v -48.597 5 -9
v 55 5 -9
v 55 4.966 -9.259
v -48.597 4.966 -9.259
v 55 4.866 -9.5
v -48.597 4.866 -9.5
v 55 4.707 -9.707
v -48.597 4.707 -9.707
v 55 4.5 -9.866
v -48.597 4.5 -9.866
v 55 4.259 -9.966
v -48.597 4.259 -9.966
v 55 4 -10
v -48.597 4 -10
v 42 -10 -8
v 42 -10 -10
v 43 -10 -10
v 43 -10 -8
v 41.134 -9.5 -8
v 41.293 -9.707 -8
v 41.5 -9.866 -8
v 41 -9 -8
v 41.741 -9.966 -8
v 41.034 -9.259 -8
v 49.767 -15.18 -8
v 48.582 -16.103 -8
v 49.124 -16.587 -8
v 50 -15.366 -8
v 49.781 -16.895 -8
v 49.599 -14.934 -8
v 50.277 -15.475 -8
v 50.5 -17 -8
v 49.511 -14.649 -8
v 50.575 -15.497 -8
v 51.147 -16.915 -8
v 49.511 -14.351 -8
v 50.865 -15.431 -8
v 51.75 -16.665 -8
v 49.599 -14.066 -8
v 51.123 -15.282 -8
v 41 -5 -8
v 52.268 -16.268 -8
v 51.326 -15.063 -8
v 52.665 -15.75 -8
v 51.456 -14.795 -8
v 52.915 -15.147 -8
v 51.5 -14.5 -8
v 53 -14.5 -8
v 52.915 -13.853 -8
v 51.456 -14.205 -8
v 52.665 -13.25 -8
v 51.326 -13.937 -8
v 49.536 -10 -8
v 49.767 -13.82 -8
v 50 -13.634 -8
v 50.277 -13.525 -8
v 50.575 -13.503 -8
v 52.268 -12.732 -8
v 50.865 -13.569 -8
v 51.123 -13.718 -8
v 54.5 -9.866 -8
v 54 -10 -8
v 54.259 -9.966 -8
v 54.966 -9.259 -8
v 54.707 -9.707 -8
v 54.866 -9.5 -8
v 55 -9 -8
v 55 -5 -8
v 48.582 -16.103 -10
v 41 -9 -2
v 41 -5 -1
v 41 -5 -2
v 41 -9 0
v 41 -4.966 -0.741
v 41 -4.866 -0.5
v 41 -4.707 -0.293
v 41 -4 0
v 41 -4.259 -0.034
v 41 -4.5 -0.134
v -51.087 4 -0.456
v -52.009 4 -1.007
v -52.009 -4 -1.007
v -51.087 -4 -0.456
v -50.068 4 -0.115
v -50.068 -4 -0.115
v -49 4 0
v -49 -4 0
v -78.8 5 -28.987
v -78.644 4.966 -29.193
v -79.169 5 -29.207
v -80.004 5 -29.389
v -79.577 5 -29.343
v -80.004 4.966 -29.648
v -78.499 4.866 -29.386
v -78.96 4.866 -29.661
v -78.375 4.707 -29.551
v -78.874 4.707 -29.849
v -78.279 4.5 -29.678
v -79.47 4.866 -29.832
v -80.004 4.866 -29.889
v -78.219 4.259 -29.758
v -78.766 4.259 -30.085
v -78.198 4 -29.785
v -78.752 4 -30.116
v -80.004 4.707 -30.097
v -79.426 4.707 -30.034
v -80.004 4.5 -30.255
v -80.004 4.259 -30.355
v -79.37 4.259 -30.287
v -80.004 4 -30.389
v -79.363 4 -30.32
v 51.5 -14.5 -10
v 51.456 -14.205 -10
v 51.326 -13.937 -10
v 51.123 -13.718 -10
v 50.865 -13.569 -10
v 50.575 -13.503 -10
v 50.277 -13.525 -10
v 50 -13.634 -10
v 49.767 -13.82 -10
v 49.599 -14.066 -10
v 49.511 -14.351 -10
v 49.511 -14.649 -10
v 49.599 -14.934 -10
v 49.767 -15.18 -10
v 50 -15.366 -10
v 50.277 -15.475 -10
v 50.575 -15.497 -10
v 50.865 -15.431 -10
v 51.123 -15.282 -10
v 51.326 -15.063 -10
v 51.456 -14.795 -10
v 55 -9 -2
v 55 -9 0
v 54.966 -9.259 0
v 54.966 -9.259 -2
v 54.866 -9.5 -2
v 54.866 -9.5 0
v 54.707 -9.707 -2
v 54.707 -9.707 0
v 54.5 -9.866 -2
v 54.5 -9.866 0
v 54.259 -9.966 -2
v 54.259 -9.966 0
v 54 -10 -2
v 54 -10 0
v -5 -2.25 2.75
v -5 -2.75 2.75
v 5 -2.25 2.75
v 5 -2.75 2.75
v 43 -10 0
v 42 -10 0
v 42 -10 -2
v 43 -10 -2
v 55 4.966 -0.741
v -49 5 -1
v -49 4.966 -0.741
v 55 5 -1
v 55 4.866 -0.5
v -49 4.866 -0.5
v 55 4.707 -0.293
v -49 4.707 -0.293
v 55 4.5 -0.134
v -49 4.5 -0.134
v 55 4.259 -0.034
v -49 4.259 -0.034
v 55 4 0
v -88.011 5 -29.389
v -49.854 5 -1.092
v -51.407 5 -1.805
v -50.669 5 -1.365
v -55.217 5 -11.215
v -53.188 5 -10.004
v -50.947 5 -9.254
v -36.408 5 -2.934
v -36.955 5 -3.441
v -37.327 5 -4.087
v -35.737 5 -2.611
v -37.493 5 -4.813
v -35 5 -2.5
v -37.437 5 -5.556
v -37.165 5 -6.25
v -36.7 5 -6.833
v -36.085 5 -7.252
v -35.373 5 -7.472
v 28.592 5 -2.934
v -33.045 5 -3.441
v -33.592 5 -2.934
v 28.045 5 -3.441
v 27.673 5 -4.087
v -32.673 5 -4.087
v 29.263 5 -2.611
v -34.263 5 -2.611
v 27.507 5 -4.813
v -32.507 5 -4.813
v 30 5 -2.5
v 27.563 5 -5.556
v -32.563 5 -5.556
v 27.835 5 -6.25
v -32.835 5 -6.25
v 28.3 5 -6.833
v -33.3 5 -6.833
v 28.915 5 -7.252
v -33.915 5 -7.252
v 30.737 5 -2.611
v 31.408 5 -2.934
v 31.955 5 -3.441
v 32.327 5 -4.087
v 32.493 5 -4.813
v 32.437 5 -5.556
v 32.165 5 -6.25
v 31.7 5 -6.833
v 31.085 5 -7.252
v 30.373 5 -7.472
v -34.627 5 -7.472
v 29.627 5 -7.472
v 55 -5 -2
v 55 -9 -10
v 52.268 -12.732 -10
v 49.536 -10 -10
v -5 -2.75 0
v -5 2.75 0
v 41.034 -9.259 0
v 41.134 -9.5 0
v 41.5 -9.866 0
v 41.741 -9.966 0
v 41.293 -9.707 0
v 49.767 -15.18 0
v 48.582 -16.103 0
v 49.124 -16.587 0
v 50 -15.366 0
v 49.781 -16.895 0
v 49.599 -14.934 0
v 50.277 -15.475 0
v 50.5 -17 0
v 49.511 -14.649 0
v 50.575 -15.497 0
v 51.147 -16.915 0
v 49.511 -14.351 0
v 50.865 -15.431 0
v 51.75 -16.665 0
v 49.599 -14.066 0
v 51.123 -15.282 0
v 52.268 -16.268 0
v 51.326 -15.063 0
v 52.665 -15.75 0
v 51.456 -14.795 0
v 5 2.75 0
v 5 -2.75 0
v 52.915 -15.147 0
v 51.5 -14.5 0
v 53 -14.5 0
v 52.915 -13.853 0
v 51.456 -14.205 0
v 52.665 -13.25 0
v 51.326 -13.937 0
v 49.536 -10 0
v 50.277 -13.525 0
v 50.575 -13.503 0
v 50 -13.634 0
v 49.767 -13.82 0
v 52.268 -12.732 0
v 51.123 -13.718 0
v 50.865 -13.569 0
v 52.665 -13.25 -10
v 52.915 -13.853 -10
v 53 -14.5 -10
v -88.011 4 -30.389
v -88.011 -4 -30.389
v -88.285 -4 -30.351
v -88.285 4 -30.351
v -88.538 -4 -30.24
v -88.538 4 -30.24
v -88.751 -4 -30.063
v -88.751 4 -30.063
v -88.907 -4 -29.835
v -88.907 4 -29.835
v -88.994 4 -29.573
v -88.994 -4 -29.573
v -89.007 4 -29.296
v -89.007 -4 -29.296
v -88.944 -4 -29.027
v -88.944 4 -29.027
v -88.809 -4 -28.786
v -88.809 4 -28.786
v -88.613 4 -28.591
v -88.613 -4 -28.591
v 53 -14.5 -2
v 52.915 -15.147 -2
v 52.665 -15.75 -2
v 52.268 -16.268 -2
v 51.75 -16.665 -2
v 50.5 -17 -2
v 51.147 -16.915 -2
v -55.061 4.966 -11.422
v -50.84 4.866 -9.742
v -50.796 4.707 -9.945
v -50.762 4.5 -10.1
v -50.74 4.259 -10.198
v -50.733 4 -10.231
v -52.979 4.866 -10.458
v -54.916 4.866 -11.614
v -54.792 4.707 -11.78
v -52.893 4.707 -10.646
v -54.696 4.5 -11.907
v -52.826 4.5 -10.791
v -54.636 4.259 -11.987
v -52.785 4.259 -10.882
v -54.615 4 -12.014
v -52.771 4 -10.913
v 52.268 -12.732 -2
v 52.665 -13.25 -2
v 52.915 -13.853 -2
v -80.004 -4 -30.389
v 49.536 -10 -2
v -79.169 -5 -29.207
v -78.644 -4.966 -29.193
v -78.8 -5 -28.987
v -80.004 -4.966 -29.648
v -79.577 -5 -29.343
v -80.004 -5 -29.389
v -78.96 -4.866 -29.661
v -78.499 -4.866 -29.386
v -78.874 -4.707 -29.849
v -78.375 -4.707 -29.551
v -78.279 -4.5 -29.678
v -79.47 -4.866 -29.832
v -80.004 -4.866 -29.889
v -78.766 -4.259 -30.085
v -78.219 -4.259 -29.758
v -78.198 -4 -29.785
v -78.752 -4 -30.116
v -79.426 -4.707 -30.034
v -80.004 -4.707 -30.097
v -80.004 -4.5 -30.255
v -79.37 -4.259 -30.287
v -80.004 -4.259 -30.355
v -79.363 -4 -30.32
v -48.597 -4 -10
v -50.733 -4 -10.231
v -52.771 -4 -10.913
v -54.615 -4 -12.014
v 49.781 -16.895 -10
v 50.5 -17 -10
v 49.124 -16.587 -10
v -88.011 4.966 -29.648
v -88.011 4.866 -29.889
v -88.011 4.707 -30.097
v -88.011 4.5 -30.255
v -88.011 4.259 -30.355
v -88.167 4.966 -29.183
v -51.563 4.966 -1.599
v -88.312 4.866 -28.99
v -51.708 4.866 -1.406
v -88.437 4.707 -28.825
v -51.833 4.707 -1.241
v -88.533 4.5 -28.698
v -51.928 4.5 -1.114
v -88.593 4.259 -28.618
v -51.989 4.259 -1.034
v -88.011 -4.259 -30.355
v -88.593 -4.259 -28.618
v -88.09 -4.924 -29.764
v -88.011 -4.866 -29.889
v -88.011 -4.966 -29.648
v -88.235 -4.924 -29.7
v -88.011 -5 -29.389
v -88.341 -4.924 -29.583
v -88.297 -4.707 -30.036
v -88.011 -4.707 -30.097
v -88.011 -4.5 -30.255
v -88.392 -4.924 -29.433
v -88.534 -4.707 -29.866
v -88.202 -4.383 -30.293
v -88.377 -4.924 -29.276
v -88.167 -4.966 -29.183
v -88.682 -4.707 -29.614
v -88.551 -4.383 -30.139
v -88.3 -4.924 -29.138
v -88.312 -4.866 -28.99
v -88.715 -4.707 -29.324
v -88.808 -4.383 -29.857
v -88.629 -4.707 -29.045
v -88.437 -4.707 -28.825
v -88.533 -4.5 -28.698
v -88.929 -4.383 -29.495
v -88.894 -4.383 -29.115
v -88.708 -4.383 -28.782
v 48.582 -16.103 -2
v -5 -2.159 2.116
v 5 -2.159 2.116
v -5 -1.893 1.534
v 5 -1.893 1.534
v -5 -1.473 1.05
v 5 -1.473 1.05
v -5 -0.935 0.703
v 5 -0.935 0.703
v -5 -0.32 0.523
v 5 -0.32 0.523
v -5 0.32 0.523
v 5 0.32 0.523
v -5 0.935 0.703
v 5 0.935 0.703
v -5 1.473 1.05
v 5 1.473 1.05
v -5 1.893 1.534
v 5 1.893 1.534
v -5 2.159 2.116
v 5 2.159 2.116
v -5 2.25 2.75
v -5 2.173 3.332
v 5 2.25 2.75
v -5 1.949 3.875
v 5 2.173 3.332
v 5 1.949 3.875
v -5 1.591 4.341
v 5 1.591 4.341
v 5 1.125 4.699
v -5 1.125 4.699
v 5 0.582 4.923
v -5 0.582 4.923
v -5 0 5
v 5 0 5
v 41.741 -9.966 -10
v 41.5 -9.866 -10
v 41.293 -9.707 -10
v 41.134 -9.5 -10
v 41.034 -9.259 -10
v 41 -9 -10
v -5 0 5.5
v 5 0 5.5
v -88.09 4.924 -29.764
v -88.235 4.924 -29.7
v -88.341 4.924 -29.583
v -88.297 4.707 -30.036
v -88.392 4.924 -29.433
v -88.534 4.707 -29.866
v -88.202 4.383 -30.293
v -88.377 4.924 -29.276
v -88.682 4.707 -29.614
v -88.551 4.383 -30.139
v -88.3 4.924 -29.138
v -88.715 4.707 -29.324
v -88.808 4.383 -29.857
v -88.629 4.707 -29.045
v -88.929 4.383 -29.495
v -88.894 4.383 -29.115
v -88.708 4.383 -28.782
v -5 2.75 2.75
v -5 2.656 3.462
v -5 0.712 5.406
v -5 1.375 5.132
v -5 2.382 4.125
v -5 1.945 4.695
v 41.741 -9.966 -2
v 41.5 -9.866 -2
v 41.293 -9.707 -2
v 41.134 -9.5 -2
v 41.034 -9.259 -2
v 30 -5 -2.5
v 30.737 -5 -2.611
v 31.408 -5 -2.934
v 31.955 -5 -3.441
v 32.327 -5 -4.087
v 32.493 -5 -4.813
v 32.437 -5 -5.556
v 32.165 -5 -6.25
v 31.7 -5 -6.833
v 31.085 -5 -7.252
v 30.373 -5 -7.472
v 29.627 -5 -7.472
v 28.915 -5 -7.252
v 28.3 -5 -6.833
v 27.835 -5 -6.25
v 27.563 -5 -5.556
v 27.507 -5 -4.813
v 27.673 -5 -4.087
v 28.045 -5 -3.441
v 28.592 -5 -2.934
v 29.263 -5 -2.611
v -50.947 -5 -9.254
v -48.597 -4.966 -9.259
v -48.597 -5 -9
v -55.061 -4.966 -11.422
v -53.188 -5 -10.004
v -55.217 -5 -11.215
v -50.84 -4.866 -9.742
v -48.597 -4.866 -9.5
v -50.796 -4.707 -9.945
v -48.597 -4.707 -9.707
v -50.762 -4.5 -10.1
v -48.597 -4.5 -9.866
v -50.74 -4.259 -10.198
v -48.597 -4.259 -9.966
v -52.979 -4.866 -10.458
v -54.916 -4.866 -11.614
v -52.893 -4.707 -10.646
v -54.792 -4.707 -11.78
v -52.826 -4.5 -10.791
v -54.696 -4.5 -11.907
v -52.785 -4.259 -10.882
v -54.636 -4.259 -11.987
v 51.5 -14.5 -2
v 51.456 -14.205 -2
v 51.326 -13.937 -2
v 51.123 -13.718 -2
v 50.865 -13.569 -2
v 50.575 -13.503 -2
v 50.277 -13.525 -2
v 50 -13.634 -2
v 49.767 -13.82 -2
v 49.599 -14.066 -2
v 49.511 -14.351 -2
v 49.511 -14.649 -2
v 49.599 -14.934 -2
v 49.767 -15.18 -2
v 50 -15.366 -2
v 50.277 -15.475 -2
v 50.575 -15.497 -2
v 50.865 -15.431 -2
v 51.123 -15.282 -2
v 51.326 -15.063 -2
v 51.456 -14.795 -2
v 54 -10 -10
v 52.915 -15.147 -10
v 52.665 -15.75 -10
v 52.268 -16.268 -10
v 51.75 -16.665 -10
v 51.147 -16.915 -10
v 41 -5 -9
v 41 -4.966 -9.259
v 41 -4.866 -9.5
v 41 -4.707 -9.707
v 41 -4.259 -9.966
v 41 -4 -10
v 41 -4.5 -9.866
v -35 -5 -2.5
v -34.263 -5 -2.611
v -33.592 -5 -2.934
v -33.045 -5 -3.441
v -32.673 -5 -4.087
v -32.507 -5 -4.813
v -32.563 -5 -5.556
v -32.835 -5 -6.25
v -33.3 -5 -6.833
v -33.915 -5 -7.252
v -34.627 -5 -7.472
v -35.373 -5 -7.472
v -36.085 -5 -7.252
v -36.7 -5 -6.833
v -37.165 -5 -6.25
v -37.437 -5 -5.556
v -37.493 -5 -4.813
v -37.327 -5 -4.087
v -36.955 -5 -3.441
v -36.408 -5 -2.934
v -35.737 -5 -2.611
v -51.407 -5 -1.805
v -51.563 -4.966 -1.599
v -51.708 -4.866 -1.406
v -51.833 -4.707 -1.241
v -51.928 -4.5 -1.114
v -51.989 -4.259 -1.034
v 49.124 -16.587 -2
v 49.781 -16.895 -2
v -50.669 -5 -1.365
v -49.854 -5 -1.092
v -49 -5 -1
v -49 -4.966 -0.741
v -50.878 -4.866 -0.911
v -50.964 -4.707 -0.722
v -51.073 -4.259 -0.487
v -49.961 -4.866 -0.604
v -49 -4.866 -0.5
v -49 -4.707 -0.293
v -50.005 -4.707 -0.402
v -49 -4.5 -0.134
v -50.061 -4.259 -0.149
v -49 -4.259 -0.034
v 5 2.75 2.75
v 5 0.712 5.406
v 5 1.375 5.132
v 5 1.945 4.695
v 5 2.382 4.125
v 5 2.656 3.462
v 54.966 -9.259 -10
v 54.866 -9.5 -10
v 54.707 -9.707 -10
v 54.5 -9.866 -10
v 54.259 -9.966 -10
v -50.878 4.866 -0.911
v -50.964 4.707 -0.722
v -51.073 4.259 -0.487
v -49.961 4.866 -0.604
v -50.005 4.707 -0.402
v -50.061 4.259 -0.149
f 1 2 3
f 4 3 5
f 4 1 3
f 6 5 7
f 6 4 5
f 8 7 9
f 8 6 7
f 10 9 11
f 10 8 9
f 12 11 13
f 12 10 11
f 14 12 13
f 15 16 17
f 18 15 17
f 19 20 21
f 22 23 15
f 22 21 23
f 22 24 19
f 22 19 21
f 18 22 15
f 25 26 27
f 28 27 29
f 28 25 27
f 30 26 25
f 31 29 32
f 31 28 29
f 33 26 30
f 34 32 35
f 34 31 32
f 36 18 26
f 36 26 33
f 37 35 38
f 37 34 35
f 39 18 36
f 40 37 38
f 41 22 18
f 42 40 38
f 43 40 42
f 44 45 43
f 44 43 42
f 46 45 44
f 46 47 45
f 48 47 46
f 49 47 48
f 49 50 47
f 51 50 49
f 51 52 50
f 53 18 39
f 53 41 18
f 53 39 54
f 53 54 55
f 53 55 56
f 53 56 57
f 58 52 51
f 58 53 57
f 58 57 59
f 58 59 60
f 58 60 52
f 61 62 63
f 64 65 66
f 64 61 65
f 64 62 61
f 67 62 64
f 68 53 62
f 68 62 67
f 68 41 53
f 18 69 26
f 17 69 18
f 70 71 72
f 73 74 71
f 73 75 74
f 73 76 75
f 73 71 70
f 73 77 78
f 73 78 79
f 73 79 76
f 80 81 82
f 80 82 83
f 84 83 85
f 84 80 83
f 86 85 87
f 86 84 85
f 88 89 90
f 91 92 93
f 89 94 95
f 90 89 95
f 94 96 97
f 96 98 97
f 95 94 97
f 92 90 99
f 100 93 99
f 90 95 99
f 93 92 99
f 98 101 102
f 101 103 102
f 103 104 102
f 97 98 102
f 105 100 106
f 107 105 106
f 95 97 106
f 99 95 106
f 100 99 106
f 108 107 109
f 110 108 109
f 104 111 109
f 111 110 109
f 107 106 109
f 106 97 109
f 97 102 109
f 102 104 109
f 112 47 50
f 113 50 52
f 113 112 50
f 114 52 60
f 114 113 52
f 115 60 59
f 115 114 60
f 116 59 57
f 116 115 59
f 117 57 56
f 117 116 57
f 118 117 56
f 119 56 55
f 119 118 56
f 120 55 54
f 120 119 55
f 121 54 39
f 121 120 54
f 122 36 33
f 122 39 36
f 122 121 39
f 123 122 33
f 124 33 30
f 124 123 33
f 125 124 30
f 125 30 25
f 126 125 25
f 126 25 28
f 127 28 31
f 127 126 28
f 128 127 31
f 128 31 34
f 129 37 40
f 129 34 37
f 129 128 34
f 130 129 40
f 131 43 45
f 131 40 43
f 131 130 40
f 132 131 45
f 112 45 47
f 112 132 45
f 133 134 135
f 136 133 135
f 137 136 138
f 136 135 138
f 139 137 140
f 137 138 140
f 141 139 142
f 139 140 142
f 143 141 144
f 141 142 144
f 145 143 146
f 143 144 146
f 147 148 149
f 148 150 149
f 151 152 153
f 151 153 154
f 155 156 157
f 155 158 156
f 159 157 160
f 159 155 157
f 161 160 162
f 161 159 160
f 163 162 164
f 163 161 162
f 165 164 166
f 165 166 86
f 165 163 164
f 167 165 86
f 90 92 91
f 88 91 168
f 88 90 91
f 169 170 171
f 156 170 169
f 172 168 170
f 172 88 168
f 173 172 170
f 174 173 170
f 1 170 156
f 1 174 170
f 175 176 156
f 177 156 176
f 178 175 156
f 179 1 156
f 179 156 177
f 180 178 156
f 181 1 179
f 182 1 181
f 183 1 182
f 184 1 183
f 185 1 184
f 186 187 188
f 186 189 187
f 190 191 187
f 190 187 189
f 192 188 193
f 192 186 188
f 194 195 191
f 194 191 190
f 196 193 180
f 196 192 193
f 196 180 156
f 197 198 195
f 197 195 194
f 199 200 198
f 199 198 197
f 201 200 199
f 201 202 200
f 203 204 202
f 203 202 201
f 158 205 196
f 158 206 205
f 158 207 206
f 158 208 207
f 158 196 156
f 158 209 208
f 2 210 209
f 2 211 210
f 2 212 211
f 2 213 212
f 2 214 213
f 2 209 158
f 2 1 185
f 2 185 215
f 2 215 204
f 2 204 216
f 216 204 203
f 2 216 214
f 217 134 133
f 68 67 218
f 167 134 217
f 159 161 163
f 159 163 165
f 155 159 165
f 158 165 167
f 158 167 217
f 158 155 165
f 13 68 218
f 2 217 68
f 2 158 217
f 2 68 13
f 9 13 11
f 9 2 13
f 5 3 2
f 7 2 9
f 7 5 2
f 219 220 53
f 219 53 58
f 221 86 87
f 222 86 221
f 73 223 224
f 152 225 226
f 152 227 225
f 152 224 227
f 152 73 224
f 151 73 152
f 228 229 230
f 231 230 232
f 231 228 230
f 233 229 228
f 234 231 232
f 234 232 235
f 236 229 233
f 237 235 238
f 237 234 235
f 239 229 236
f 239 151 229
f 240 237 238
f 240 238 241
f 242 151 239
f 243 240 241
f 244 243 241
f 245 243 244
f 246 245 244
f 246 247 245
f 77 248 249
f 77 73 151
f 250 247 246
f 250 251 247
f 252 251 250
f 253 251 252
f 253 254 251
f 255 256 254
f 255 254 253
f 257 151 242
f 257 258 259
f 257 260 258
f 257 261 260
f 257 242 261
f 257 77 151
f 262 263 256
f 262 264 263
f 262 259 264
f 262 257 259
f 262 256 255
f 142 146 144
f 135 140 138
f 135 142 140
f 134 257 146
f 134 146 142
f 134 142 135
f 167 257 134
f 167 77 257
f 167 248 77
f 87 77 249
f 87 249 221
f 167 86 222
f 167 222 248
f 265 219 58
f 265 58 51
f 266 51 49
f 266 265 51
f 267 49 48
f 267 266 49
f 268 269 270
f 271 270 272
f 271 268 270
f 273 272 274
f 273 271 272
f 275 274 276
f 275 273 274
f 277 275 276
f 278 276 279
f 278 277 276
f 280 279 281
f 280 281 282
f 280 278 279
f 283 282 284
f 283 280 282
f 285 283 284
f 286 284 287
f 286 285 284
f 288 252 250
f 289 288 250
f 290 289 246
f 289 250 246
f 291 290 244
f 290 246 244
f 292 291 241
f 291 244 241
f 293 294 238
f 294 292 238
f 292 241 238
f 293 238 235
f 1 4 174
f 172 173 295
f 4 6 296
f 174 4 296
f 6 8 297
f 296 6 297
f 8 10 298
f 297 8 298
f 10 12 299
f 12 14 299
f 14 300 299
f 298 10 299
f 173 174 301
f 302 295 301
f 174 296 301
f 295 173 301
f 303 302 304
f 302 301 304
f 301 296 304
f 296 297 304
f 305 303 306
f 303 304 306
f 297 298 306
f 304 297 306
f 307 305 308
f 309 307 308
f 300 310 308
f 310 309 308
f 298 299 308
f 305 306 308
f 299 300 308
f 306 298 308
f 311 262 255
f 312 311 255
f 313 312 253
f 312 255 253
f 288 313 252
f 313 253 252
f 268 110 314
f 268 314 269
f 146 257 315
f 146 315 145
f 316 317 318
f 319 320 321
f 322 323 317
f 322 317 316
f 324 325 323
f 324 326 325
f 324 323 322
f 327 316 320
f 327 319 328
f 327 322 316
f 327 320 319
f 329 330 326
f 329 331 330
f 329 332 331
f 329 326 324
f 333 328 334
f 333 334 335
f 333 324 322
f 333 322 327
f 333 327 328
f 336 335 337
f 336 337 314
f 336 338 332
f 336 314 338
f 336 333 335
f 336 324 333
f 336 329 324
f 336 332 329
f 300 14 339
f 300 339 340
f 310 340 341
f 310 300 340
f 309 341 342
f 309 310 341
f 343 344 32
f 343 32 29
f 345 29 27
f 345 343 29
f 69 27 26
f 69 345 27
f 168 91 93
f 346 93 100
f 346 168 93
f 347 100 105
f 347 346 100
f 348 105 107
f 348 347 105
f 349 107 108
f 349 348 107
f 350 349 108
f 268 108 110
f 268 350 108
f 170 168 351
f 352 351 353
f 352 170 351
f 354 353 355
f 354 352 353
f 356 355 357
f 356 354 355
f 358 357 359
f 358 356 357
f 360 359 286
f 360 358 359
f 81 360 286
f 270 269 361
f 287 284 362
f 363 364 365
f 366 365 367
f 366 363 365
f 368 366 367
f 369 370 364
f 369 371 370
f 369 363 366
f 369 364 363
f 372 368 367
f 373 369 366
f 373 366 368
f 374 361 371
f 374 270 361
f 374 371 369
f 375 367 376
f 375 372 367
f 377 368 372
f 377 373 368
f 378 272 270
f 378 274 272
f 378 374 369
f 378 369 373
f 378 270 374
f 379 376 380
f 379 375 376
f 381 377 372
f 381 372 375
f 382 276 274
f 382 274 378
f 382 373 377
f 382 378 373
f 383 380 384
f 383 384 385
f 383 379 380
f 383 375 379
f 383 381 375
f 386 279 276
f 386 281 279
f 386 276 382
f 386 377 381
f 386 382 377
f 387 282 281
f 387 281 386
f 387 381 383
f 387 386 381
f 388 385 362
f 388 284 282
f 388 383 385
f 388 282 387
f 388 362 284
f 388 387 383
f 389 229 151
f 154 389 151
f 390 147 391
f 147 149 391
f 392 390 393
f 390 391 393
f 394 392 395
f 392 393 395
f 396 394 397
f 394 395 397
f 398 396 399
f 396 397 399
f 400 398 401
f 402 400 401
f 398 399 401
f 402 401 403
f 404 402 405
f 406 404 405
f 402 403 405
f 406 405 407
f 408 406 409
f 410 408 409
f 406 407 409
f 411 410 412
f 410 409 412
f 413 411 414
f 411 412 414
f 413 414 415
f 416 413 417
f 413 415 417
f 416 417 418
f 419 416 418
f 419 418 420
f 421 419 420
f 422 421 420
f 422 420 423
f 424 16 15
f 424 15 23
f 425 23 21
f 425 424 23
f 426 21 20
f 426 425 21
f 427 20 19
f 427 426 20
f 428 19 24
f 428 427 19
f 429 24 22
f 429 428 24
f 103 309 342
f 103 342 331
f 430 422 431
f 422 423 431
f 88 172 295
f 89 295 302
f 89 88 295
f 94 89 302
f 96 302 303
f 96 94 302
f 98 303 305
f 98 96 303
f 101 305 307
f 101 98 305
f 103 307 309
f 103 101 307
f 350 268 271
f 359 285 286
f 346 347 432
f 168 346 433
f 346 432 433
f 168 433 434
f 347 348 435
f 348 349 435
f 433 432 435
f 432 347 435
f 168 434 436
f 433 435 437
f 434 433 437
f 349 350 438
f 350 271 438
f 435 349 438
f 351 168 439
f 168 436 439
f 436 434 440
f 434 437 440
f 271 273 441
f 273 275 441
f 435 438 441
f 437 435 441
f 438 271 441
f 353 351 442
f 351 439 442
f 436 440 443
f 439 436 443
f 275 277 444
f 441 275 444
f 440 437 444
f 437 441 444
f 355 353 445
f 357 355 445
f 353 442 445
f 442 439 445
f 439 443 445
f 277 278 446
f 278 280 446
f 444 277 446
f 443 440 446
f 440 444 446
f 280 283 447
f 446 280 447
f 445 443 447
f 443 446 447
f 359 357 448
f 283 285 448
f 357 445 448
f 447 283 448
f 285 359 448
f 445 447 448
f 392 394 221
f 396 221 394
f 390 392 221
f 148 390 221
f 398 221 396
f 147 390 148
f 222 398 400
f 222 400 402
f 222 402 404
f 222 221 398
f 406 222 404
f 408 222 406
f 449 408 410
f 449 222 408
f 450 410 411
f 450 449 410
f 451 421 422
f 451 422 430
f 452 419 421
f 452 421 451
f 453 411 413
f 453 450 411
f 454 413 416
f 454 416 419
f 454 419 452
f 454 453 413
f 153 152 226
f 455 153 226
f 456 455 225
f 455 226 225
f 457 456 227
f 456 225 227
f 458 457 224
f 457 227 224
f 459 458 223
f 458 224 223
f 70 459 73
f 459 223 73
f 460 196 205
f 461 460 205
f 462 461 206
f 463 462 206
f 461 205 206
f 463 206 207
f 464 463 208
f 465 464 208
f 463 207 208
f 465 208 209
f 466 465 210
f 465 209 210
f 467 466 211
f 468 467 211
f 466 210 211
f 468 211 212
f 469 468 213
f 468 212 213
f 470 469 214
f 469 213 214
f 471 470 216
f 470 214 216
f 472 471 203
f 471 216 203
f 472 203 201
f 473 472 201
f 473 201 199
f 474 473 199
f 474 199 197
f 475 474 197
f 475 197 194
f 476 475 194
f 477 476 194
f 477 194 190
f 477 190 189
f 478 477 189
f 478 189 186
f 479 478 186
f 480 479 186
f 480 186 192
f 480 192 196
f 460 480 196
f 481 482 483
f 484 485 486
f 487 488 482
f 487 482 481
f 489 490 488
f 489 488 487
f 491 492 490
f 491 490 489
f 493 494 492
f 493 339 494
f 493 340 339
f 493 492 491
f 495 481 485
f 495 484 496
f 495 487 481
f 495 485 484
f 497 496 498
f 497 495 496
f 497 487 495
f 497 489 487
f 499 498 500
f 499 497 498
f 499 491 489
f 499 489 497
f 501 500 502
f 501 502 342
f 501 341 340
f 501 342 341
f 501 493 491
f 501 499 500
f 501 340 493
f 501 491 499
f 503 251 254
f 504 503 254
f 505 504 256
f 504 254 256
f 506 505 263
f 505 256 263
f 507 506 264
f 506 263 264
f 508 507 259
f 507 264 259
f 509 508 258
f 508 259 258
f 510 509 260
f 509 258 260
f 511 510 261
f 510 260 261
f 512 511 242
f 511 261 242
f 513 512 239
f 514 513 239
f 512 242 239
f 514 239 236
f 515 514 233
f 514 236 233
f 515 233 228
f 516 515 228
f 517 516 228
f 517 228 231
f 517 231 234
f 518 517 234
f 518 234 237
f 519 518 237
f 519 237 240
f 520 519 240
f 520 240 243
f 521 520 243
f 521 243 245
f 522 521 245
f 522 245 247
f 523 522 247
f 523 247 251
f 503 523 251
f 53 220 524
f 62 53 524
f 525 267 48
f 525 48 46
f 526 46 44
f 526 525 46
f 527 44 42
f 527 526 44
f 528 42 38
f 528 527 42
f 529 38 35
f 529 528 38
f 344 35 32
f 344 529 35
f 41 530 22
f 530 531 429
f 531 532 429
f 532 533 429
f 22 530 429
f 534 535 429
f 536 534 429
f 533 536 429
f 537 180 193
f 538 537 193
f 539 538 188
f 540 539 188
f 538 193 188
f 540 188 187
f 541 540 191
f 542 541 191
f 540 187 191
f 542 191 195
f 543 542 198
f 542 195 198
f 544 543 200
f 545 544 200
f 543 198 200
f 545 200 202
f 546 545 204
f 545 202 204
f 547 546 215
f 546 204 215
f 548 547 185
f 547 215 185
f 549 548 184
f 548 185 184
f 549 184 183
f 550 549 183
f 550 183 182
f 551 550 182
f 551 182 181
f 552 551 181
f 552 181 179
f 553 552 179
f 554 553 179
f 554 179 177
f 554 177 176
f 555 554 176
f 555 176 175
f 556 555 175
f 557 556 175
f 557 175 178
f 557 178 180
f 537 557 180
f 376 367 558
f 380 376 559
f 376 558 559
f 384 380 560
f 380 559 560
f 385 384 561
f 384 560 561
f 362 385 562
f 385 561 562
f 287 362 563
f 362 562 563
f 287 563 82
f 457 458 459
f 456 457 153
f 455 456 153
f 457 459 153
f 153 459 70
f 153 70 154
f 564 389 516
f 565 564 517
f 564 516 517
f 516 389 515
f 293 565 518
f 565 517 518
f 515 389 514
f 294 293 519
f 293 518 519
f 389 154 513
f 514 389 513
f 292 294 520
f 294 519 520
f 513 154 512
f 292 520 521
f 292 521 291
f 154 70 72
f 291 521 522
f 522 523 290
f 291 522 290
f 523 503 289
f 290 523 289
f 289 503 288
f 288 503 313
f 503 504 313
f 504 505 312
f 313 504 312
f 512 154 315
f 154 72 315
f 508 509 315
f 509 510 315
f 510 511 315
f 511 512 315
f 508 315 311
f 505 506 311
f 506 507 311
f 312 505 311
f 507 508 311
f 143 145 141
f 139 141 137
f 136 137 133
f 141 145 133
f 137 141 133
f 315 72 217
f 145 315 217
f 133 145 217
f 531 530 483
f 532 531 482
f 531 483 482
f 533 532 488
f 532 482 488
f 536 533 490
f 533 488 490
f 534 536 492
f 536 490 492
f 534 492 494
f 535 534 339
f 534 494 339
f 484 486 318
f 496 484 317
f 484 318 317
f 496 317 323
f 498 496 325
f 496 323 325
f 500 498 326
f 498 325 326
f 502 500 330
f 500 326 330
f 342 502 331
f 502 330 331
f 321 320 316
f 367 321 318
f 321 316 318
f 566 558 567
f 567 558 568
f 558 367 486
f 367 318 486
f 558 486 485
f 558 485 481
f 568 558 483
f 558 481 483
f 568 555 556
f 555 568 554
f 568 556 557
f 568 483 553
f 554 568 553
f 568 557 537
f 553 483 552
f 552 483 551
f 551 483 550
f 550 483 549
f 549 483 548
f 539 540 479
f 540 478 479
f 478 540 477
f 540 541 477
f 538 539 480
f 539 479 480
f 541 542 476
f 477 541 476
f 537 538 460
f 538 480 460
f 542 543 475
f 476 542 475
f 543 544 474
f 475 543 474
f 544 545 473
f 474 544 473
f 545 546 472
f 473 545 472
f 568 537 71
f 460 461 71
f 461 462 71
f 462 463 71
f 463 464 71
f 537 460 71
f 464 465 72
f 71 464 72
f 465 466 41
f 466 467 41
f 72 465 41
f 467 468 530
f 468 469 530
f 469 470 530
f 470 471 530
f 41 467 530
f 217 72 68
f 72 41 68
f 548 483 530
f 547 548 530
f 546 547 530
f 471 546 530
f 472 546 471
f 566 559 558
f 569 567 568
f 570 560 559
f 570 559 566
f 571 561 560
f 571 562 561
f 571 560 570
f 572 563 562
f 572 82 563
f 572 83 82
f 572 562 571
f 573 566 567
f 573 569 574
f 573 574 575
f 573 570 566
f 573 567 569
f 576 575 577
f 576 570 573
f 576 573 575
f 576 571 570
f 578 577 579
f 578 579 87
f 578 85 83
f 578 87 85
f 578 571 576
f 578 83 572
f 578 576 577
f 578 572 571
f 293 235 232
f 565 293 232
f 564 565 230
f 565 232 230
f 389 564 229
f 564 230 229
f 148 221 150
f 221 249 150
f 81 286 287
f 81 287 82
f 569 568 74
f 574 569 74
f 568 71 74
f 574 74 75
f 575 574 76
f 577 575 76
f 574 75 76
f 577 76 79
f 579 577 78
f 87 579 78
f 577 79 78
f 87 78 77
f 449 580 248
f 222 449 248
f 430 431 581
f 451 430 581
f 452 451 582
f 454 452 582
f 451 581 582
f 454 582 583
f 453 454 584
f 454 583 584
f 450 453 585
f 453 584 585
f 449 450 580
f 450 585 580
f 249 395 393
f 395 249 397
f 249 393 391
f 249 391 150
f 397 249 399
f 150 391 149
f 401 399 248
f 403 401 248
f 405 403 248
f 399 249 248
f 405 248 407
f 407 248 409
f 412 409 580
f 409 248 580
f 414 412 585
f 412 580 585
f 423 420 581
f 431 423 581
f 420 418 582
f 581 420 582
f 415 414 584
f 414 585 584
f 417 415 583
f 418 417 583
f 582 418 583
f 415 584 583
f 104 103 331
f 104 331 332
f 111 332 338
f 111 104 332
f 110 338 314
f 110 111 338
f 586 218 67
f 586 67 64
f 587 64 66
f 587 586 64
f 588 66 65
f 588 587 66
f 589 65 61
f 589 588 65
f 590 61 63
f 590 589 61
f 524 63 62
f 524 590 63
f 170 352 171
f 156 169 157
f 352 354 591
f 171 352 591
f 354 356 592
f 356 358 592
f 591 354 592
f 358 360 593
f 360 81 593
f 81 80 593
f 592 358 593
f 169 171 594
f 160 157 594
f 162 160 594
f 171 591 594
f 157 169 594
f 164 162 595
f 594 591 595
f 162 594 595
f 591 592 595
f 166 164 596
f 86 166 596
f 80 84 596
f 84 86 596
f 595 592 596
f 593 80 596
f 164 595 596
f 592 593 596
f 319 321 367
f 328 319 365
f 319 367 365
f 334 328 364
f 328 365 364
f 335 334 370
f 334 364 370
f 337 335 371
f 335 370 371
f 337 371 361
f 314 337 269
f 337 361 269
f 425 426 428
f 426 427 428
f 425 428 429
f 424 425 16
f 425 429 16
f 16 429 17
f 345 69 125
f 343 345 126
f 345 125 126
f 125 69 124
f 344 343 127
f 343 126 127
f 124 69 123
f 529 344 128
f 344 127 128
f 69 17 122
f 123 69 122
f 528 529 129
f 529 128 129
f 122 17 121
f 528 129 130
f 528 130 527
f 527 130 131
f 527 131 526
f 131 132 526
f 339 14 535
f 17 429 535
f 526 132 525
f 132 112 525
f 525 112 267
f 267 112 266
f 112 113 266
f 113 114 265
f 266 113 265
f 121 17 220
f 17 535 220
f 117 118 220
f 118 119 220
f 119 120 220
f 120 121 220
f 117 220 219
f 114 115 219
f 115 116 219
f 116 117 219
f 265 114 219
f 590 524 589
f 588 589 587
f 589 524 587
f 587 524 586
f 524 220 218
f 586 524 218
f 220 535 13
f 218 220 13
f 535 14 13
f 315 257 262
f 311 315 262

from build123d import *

# Parameters (mm, degrees)
BOSS_EXTRUDE2_DEPTH = 5
BOSS_EXTRUDE3_DEPTH = 2
SKETCH4_R           = 1
CUT_EXTRUDE1_DEPTH  = 96.580030811
FILLET1_R           = 1
FILLET2_R           = 1
SKETCH5_R           = 2.5
CUT_EXTRUDE2_DEPTH  = 97.594732206
BOSS_EXTRUDE4_DEPTH = 5


with BuildPart() as part:
    # Sketch1 → Boss-Extrude2 (new, symmetric)
    with BuildSketch(Plane(origin=(0, 0, 0), x_dir=(1, 0, 0), z_dir=(0, 1, 0))):
        with BuildLine():
            Line((-49, 0), (49, 0))
            Line((49, 0), (55, 0))
            Line((55, 0), (55, 10))
            Line((55, 10), (49, 10))
            Line((49, 10), (-48.597064799, 10))
            ThreePointArc((-48.597064799, 10), (-51.770174838, 10.516784686), (-54.615321941, 12.013725463))
            Line((-54.615321941, 12.013725463), (-78.198331144, 29.785292532))
            ThreePointArc((-78.198331144, 29.785292532), (-79.051875275, 30.234374765), (-80.003808287, 30.389410171))
            Line((-80.003808287, 30.389410171), (-88.011381516, 30.389410171))
            ThreePointArc((-88.011381516, 30.389410171), (-88.959703047, 29.706721175), (-88.61320723, 28.590782717))
            Line((-88.61320723, 28.590782717), (-52.009128571, 1.006862732))
            ThreePointArc((-52.009128571, 1.006862732), (-50.586555019, 0.258392343), (-49, 0))
        make_face()
    extrude(amount=BOSS_EXTRUDE2_DEPTH, both=True)

    # Sketch3 → Boss-Extrude3 (add)
    with BuildSketch(Plane.XY):
        Polygon((55, -5), (41, -5), (41, -10), (43, -10), (43, -17), (53, -17), (53, -10), (55, -10), align=None)
    boss_extrude3 = extrude(amount=-BOSS_EXTRUDE3_DEPTH)

    # Sketch4 → Cut-Extrude1 (cut, through all)
    with BuildSketch(Plane.XY):
        with BuildLine():
            Line((55, -10), (55, -9))
            ThreePointArc((55, -9), (54.707106781, -9.707106781), (54, -10))
            Line((54, -10), (55, -10))
        make_face()
        with BuildLine():
            Line((53, -14.5), (53, -10))
            Line((53, -10), (49.535533906, -10))
            Line((49.535533906, -10), (52.267766953, -12.732233047))
            ThreePointArc((52.267766953, -12.732233047), (52.809698831, -13.543291419), (53, -14.5))
        make_face()
        with BuildLine():
            Line((53, -17), (53, -14.5))
            ThreePointArc((53, -14.5), (52.267766953, -16.267766953), (50.5, -17))
            Line((50.5, -17), (53, -17))
        make_face()
        with BuildLine():
            ThreePointArc((42, -10), (41.292893219, -9.707106781), (41, -9))
            Line((41, -9), (41, -10))
            Line((41, -10), (42, -10))
        make_face()
        with BuildLine():
            Line((43, -17), (50.5, -17))
            ThreePointArc((50.5, -17), (49.441268366, -16.764748844), (48.581791004, -16.103269862))
            Line((48.581791004, -16.103269862), (43, -10))
            Line((43, -10), (43, -17))
        make_face()
        with Locations((50.5, -14.5)):
            Circle(SKETCH4_R)
    cut_extrude1 = extrude(amount=-CUT_EXTRUDE1_DEPTH, mode=Mode.SUBTRACT)

    # Mirror1: Boss-Extrude3, Cut-Extrude1 across plane
    add(boss_extrude3.mirror(Plane.XY.offset(-5)))
    add(cut_extrude1.mirror(Plane.XY.offset(-5)), mode=Mode.SUBTRACT)

    # Fillet1
    fillet1_edges = [part.edges().sort_by_distance(p)[0] for p in [
        (-4, -5, 0),
        (-50.586555019, -5, -0.258392343),
        (-70.3111679, -5, -14.798822724),
        (-88.959703047, -5, -29.706721175),
        (-84.007594901, -5, -30.389410171),
        (-79.051875275, -5, -30.234374765),
        (-66.406826543, -5, -20.899508998),
        (-3.7985324, -5, -10),
        (-51.770174838, -5, -10.516784686),
    ]]
    fillet(fillet1_edges, radius=FILLET1_R)

    # Fillet2
    fillet2_edges = [part.edges().sort_by_distance(p)[0] for p in [
        (3.2014676, 5, -10),
        (-51.770174838, 5, -10.516784686),
        (-66.406826543, 5, -20.899508998),
        (-79.051875275, 5, -30.234374765),
        (-84.007594901, 5, -30.389410171),
        (-88.959703047, 5, -29.706721175),
        (-70.3111679, 5, -14.798822724),
        (-50.586555019, 5, -0.258392343),
        (3, 5, 0),
    ]]
    fillet(fillet2_edges, radius=FILLET2_R)

    # Sketch5 → Cut-Extrude2 (cut, through all)
    with BuildSketch(Plane(origin=(0, 5, 0), x_dir=(1, 0, 0), z_dir=(0, 1, 0))):
        with Locations(Location((30, 5, 0), (0, 0, 270))):
            Circle(SKETCH5_R)
        with Locations(Location((-35, 5, 0), (0, 0, 270))):
            Circle(SKETCH5_R)
    extrude(amount=-CUT_EXTRUDE2_DEPTH, mode=Mode.SUBTRACT)

    # Sketch6 → Boss-Extrude4 (add, symmetric)
    with BuildSketch(Plane(origin=(0, 0, 0), x_dir=(0, 0, -1), z_dir=(1, 0, 0))):
        with BuildLine():
            Line((0, 2.75), (0, -2.75))
            Line((0, -2.75), (-2.75, -2.75))
            Line((-2.75, -2.75), (-2.75, -2.25))
            ThreePointArc((-2.75, -2.25), (-0.5, 0), (-2.75, 2.25))
            ThreePointArc((-2.75, 2.25), (-4.340990258, 1.590990258), (-5, 0))
            Line((-5, 0), (-5.5, 0))
            ThreePointArc((-5.5, 0), (-4.694543648, 1.944543648), (-2.75, 2.75))
            Line((-2.75, 2.75), (0, 2.75))
        make_face()
    extrude(amount=BOSS_EXTRUDE4_DEPTH, both=True)


solid = part.part
